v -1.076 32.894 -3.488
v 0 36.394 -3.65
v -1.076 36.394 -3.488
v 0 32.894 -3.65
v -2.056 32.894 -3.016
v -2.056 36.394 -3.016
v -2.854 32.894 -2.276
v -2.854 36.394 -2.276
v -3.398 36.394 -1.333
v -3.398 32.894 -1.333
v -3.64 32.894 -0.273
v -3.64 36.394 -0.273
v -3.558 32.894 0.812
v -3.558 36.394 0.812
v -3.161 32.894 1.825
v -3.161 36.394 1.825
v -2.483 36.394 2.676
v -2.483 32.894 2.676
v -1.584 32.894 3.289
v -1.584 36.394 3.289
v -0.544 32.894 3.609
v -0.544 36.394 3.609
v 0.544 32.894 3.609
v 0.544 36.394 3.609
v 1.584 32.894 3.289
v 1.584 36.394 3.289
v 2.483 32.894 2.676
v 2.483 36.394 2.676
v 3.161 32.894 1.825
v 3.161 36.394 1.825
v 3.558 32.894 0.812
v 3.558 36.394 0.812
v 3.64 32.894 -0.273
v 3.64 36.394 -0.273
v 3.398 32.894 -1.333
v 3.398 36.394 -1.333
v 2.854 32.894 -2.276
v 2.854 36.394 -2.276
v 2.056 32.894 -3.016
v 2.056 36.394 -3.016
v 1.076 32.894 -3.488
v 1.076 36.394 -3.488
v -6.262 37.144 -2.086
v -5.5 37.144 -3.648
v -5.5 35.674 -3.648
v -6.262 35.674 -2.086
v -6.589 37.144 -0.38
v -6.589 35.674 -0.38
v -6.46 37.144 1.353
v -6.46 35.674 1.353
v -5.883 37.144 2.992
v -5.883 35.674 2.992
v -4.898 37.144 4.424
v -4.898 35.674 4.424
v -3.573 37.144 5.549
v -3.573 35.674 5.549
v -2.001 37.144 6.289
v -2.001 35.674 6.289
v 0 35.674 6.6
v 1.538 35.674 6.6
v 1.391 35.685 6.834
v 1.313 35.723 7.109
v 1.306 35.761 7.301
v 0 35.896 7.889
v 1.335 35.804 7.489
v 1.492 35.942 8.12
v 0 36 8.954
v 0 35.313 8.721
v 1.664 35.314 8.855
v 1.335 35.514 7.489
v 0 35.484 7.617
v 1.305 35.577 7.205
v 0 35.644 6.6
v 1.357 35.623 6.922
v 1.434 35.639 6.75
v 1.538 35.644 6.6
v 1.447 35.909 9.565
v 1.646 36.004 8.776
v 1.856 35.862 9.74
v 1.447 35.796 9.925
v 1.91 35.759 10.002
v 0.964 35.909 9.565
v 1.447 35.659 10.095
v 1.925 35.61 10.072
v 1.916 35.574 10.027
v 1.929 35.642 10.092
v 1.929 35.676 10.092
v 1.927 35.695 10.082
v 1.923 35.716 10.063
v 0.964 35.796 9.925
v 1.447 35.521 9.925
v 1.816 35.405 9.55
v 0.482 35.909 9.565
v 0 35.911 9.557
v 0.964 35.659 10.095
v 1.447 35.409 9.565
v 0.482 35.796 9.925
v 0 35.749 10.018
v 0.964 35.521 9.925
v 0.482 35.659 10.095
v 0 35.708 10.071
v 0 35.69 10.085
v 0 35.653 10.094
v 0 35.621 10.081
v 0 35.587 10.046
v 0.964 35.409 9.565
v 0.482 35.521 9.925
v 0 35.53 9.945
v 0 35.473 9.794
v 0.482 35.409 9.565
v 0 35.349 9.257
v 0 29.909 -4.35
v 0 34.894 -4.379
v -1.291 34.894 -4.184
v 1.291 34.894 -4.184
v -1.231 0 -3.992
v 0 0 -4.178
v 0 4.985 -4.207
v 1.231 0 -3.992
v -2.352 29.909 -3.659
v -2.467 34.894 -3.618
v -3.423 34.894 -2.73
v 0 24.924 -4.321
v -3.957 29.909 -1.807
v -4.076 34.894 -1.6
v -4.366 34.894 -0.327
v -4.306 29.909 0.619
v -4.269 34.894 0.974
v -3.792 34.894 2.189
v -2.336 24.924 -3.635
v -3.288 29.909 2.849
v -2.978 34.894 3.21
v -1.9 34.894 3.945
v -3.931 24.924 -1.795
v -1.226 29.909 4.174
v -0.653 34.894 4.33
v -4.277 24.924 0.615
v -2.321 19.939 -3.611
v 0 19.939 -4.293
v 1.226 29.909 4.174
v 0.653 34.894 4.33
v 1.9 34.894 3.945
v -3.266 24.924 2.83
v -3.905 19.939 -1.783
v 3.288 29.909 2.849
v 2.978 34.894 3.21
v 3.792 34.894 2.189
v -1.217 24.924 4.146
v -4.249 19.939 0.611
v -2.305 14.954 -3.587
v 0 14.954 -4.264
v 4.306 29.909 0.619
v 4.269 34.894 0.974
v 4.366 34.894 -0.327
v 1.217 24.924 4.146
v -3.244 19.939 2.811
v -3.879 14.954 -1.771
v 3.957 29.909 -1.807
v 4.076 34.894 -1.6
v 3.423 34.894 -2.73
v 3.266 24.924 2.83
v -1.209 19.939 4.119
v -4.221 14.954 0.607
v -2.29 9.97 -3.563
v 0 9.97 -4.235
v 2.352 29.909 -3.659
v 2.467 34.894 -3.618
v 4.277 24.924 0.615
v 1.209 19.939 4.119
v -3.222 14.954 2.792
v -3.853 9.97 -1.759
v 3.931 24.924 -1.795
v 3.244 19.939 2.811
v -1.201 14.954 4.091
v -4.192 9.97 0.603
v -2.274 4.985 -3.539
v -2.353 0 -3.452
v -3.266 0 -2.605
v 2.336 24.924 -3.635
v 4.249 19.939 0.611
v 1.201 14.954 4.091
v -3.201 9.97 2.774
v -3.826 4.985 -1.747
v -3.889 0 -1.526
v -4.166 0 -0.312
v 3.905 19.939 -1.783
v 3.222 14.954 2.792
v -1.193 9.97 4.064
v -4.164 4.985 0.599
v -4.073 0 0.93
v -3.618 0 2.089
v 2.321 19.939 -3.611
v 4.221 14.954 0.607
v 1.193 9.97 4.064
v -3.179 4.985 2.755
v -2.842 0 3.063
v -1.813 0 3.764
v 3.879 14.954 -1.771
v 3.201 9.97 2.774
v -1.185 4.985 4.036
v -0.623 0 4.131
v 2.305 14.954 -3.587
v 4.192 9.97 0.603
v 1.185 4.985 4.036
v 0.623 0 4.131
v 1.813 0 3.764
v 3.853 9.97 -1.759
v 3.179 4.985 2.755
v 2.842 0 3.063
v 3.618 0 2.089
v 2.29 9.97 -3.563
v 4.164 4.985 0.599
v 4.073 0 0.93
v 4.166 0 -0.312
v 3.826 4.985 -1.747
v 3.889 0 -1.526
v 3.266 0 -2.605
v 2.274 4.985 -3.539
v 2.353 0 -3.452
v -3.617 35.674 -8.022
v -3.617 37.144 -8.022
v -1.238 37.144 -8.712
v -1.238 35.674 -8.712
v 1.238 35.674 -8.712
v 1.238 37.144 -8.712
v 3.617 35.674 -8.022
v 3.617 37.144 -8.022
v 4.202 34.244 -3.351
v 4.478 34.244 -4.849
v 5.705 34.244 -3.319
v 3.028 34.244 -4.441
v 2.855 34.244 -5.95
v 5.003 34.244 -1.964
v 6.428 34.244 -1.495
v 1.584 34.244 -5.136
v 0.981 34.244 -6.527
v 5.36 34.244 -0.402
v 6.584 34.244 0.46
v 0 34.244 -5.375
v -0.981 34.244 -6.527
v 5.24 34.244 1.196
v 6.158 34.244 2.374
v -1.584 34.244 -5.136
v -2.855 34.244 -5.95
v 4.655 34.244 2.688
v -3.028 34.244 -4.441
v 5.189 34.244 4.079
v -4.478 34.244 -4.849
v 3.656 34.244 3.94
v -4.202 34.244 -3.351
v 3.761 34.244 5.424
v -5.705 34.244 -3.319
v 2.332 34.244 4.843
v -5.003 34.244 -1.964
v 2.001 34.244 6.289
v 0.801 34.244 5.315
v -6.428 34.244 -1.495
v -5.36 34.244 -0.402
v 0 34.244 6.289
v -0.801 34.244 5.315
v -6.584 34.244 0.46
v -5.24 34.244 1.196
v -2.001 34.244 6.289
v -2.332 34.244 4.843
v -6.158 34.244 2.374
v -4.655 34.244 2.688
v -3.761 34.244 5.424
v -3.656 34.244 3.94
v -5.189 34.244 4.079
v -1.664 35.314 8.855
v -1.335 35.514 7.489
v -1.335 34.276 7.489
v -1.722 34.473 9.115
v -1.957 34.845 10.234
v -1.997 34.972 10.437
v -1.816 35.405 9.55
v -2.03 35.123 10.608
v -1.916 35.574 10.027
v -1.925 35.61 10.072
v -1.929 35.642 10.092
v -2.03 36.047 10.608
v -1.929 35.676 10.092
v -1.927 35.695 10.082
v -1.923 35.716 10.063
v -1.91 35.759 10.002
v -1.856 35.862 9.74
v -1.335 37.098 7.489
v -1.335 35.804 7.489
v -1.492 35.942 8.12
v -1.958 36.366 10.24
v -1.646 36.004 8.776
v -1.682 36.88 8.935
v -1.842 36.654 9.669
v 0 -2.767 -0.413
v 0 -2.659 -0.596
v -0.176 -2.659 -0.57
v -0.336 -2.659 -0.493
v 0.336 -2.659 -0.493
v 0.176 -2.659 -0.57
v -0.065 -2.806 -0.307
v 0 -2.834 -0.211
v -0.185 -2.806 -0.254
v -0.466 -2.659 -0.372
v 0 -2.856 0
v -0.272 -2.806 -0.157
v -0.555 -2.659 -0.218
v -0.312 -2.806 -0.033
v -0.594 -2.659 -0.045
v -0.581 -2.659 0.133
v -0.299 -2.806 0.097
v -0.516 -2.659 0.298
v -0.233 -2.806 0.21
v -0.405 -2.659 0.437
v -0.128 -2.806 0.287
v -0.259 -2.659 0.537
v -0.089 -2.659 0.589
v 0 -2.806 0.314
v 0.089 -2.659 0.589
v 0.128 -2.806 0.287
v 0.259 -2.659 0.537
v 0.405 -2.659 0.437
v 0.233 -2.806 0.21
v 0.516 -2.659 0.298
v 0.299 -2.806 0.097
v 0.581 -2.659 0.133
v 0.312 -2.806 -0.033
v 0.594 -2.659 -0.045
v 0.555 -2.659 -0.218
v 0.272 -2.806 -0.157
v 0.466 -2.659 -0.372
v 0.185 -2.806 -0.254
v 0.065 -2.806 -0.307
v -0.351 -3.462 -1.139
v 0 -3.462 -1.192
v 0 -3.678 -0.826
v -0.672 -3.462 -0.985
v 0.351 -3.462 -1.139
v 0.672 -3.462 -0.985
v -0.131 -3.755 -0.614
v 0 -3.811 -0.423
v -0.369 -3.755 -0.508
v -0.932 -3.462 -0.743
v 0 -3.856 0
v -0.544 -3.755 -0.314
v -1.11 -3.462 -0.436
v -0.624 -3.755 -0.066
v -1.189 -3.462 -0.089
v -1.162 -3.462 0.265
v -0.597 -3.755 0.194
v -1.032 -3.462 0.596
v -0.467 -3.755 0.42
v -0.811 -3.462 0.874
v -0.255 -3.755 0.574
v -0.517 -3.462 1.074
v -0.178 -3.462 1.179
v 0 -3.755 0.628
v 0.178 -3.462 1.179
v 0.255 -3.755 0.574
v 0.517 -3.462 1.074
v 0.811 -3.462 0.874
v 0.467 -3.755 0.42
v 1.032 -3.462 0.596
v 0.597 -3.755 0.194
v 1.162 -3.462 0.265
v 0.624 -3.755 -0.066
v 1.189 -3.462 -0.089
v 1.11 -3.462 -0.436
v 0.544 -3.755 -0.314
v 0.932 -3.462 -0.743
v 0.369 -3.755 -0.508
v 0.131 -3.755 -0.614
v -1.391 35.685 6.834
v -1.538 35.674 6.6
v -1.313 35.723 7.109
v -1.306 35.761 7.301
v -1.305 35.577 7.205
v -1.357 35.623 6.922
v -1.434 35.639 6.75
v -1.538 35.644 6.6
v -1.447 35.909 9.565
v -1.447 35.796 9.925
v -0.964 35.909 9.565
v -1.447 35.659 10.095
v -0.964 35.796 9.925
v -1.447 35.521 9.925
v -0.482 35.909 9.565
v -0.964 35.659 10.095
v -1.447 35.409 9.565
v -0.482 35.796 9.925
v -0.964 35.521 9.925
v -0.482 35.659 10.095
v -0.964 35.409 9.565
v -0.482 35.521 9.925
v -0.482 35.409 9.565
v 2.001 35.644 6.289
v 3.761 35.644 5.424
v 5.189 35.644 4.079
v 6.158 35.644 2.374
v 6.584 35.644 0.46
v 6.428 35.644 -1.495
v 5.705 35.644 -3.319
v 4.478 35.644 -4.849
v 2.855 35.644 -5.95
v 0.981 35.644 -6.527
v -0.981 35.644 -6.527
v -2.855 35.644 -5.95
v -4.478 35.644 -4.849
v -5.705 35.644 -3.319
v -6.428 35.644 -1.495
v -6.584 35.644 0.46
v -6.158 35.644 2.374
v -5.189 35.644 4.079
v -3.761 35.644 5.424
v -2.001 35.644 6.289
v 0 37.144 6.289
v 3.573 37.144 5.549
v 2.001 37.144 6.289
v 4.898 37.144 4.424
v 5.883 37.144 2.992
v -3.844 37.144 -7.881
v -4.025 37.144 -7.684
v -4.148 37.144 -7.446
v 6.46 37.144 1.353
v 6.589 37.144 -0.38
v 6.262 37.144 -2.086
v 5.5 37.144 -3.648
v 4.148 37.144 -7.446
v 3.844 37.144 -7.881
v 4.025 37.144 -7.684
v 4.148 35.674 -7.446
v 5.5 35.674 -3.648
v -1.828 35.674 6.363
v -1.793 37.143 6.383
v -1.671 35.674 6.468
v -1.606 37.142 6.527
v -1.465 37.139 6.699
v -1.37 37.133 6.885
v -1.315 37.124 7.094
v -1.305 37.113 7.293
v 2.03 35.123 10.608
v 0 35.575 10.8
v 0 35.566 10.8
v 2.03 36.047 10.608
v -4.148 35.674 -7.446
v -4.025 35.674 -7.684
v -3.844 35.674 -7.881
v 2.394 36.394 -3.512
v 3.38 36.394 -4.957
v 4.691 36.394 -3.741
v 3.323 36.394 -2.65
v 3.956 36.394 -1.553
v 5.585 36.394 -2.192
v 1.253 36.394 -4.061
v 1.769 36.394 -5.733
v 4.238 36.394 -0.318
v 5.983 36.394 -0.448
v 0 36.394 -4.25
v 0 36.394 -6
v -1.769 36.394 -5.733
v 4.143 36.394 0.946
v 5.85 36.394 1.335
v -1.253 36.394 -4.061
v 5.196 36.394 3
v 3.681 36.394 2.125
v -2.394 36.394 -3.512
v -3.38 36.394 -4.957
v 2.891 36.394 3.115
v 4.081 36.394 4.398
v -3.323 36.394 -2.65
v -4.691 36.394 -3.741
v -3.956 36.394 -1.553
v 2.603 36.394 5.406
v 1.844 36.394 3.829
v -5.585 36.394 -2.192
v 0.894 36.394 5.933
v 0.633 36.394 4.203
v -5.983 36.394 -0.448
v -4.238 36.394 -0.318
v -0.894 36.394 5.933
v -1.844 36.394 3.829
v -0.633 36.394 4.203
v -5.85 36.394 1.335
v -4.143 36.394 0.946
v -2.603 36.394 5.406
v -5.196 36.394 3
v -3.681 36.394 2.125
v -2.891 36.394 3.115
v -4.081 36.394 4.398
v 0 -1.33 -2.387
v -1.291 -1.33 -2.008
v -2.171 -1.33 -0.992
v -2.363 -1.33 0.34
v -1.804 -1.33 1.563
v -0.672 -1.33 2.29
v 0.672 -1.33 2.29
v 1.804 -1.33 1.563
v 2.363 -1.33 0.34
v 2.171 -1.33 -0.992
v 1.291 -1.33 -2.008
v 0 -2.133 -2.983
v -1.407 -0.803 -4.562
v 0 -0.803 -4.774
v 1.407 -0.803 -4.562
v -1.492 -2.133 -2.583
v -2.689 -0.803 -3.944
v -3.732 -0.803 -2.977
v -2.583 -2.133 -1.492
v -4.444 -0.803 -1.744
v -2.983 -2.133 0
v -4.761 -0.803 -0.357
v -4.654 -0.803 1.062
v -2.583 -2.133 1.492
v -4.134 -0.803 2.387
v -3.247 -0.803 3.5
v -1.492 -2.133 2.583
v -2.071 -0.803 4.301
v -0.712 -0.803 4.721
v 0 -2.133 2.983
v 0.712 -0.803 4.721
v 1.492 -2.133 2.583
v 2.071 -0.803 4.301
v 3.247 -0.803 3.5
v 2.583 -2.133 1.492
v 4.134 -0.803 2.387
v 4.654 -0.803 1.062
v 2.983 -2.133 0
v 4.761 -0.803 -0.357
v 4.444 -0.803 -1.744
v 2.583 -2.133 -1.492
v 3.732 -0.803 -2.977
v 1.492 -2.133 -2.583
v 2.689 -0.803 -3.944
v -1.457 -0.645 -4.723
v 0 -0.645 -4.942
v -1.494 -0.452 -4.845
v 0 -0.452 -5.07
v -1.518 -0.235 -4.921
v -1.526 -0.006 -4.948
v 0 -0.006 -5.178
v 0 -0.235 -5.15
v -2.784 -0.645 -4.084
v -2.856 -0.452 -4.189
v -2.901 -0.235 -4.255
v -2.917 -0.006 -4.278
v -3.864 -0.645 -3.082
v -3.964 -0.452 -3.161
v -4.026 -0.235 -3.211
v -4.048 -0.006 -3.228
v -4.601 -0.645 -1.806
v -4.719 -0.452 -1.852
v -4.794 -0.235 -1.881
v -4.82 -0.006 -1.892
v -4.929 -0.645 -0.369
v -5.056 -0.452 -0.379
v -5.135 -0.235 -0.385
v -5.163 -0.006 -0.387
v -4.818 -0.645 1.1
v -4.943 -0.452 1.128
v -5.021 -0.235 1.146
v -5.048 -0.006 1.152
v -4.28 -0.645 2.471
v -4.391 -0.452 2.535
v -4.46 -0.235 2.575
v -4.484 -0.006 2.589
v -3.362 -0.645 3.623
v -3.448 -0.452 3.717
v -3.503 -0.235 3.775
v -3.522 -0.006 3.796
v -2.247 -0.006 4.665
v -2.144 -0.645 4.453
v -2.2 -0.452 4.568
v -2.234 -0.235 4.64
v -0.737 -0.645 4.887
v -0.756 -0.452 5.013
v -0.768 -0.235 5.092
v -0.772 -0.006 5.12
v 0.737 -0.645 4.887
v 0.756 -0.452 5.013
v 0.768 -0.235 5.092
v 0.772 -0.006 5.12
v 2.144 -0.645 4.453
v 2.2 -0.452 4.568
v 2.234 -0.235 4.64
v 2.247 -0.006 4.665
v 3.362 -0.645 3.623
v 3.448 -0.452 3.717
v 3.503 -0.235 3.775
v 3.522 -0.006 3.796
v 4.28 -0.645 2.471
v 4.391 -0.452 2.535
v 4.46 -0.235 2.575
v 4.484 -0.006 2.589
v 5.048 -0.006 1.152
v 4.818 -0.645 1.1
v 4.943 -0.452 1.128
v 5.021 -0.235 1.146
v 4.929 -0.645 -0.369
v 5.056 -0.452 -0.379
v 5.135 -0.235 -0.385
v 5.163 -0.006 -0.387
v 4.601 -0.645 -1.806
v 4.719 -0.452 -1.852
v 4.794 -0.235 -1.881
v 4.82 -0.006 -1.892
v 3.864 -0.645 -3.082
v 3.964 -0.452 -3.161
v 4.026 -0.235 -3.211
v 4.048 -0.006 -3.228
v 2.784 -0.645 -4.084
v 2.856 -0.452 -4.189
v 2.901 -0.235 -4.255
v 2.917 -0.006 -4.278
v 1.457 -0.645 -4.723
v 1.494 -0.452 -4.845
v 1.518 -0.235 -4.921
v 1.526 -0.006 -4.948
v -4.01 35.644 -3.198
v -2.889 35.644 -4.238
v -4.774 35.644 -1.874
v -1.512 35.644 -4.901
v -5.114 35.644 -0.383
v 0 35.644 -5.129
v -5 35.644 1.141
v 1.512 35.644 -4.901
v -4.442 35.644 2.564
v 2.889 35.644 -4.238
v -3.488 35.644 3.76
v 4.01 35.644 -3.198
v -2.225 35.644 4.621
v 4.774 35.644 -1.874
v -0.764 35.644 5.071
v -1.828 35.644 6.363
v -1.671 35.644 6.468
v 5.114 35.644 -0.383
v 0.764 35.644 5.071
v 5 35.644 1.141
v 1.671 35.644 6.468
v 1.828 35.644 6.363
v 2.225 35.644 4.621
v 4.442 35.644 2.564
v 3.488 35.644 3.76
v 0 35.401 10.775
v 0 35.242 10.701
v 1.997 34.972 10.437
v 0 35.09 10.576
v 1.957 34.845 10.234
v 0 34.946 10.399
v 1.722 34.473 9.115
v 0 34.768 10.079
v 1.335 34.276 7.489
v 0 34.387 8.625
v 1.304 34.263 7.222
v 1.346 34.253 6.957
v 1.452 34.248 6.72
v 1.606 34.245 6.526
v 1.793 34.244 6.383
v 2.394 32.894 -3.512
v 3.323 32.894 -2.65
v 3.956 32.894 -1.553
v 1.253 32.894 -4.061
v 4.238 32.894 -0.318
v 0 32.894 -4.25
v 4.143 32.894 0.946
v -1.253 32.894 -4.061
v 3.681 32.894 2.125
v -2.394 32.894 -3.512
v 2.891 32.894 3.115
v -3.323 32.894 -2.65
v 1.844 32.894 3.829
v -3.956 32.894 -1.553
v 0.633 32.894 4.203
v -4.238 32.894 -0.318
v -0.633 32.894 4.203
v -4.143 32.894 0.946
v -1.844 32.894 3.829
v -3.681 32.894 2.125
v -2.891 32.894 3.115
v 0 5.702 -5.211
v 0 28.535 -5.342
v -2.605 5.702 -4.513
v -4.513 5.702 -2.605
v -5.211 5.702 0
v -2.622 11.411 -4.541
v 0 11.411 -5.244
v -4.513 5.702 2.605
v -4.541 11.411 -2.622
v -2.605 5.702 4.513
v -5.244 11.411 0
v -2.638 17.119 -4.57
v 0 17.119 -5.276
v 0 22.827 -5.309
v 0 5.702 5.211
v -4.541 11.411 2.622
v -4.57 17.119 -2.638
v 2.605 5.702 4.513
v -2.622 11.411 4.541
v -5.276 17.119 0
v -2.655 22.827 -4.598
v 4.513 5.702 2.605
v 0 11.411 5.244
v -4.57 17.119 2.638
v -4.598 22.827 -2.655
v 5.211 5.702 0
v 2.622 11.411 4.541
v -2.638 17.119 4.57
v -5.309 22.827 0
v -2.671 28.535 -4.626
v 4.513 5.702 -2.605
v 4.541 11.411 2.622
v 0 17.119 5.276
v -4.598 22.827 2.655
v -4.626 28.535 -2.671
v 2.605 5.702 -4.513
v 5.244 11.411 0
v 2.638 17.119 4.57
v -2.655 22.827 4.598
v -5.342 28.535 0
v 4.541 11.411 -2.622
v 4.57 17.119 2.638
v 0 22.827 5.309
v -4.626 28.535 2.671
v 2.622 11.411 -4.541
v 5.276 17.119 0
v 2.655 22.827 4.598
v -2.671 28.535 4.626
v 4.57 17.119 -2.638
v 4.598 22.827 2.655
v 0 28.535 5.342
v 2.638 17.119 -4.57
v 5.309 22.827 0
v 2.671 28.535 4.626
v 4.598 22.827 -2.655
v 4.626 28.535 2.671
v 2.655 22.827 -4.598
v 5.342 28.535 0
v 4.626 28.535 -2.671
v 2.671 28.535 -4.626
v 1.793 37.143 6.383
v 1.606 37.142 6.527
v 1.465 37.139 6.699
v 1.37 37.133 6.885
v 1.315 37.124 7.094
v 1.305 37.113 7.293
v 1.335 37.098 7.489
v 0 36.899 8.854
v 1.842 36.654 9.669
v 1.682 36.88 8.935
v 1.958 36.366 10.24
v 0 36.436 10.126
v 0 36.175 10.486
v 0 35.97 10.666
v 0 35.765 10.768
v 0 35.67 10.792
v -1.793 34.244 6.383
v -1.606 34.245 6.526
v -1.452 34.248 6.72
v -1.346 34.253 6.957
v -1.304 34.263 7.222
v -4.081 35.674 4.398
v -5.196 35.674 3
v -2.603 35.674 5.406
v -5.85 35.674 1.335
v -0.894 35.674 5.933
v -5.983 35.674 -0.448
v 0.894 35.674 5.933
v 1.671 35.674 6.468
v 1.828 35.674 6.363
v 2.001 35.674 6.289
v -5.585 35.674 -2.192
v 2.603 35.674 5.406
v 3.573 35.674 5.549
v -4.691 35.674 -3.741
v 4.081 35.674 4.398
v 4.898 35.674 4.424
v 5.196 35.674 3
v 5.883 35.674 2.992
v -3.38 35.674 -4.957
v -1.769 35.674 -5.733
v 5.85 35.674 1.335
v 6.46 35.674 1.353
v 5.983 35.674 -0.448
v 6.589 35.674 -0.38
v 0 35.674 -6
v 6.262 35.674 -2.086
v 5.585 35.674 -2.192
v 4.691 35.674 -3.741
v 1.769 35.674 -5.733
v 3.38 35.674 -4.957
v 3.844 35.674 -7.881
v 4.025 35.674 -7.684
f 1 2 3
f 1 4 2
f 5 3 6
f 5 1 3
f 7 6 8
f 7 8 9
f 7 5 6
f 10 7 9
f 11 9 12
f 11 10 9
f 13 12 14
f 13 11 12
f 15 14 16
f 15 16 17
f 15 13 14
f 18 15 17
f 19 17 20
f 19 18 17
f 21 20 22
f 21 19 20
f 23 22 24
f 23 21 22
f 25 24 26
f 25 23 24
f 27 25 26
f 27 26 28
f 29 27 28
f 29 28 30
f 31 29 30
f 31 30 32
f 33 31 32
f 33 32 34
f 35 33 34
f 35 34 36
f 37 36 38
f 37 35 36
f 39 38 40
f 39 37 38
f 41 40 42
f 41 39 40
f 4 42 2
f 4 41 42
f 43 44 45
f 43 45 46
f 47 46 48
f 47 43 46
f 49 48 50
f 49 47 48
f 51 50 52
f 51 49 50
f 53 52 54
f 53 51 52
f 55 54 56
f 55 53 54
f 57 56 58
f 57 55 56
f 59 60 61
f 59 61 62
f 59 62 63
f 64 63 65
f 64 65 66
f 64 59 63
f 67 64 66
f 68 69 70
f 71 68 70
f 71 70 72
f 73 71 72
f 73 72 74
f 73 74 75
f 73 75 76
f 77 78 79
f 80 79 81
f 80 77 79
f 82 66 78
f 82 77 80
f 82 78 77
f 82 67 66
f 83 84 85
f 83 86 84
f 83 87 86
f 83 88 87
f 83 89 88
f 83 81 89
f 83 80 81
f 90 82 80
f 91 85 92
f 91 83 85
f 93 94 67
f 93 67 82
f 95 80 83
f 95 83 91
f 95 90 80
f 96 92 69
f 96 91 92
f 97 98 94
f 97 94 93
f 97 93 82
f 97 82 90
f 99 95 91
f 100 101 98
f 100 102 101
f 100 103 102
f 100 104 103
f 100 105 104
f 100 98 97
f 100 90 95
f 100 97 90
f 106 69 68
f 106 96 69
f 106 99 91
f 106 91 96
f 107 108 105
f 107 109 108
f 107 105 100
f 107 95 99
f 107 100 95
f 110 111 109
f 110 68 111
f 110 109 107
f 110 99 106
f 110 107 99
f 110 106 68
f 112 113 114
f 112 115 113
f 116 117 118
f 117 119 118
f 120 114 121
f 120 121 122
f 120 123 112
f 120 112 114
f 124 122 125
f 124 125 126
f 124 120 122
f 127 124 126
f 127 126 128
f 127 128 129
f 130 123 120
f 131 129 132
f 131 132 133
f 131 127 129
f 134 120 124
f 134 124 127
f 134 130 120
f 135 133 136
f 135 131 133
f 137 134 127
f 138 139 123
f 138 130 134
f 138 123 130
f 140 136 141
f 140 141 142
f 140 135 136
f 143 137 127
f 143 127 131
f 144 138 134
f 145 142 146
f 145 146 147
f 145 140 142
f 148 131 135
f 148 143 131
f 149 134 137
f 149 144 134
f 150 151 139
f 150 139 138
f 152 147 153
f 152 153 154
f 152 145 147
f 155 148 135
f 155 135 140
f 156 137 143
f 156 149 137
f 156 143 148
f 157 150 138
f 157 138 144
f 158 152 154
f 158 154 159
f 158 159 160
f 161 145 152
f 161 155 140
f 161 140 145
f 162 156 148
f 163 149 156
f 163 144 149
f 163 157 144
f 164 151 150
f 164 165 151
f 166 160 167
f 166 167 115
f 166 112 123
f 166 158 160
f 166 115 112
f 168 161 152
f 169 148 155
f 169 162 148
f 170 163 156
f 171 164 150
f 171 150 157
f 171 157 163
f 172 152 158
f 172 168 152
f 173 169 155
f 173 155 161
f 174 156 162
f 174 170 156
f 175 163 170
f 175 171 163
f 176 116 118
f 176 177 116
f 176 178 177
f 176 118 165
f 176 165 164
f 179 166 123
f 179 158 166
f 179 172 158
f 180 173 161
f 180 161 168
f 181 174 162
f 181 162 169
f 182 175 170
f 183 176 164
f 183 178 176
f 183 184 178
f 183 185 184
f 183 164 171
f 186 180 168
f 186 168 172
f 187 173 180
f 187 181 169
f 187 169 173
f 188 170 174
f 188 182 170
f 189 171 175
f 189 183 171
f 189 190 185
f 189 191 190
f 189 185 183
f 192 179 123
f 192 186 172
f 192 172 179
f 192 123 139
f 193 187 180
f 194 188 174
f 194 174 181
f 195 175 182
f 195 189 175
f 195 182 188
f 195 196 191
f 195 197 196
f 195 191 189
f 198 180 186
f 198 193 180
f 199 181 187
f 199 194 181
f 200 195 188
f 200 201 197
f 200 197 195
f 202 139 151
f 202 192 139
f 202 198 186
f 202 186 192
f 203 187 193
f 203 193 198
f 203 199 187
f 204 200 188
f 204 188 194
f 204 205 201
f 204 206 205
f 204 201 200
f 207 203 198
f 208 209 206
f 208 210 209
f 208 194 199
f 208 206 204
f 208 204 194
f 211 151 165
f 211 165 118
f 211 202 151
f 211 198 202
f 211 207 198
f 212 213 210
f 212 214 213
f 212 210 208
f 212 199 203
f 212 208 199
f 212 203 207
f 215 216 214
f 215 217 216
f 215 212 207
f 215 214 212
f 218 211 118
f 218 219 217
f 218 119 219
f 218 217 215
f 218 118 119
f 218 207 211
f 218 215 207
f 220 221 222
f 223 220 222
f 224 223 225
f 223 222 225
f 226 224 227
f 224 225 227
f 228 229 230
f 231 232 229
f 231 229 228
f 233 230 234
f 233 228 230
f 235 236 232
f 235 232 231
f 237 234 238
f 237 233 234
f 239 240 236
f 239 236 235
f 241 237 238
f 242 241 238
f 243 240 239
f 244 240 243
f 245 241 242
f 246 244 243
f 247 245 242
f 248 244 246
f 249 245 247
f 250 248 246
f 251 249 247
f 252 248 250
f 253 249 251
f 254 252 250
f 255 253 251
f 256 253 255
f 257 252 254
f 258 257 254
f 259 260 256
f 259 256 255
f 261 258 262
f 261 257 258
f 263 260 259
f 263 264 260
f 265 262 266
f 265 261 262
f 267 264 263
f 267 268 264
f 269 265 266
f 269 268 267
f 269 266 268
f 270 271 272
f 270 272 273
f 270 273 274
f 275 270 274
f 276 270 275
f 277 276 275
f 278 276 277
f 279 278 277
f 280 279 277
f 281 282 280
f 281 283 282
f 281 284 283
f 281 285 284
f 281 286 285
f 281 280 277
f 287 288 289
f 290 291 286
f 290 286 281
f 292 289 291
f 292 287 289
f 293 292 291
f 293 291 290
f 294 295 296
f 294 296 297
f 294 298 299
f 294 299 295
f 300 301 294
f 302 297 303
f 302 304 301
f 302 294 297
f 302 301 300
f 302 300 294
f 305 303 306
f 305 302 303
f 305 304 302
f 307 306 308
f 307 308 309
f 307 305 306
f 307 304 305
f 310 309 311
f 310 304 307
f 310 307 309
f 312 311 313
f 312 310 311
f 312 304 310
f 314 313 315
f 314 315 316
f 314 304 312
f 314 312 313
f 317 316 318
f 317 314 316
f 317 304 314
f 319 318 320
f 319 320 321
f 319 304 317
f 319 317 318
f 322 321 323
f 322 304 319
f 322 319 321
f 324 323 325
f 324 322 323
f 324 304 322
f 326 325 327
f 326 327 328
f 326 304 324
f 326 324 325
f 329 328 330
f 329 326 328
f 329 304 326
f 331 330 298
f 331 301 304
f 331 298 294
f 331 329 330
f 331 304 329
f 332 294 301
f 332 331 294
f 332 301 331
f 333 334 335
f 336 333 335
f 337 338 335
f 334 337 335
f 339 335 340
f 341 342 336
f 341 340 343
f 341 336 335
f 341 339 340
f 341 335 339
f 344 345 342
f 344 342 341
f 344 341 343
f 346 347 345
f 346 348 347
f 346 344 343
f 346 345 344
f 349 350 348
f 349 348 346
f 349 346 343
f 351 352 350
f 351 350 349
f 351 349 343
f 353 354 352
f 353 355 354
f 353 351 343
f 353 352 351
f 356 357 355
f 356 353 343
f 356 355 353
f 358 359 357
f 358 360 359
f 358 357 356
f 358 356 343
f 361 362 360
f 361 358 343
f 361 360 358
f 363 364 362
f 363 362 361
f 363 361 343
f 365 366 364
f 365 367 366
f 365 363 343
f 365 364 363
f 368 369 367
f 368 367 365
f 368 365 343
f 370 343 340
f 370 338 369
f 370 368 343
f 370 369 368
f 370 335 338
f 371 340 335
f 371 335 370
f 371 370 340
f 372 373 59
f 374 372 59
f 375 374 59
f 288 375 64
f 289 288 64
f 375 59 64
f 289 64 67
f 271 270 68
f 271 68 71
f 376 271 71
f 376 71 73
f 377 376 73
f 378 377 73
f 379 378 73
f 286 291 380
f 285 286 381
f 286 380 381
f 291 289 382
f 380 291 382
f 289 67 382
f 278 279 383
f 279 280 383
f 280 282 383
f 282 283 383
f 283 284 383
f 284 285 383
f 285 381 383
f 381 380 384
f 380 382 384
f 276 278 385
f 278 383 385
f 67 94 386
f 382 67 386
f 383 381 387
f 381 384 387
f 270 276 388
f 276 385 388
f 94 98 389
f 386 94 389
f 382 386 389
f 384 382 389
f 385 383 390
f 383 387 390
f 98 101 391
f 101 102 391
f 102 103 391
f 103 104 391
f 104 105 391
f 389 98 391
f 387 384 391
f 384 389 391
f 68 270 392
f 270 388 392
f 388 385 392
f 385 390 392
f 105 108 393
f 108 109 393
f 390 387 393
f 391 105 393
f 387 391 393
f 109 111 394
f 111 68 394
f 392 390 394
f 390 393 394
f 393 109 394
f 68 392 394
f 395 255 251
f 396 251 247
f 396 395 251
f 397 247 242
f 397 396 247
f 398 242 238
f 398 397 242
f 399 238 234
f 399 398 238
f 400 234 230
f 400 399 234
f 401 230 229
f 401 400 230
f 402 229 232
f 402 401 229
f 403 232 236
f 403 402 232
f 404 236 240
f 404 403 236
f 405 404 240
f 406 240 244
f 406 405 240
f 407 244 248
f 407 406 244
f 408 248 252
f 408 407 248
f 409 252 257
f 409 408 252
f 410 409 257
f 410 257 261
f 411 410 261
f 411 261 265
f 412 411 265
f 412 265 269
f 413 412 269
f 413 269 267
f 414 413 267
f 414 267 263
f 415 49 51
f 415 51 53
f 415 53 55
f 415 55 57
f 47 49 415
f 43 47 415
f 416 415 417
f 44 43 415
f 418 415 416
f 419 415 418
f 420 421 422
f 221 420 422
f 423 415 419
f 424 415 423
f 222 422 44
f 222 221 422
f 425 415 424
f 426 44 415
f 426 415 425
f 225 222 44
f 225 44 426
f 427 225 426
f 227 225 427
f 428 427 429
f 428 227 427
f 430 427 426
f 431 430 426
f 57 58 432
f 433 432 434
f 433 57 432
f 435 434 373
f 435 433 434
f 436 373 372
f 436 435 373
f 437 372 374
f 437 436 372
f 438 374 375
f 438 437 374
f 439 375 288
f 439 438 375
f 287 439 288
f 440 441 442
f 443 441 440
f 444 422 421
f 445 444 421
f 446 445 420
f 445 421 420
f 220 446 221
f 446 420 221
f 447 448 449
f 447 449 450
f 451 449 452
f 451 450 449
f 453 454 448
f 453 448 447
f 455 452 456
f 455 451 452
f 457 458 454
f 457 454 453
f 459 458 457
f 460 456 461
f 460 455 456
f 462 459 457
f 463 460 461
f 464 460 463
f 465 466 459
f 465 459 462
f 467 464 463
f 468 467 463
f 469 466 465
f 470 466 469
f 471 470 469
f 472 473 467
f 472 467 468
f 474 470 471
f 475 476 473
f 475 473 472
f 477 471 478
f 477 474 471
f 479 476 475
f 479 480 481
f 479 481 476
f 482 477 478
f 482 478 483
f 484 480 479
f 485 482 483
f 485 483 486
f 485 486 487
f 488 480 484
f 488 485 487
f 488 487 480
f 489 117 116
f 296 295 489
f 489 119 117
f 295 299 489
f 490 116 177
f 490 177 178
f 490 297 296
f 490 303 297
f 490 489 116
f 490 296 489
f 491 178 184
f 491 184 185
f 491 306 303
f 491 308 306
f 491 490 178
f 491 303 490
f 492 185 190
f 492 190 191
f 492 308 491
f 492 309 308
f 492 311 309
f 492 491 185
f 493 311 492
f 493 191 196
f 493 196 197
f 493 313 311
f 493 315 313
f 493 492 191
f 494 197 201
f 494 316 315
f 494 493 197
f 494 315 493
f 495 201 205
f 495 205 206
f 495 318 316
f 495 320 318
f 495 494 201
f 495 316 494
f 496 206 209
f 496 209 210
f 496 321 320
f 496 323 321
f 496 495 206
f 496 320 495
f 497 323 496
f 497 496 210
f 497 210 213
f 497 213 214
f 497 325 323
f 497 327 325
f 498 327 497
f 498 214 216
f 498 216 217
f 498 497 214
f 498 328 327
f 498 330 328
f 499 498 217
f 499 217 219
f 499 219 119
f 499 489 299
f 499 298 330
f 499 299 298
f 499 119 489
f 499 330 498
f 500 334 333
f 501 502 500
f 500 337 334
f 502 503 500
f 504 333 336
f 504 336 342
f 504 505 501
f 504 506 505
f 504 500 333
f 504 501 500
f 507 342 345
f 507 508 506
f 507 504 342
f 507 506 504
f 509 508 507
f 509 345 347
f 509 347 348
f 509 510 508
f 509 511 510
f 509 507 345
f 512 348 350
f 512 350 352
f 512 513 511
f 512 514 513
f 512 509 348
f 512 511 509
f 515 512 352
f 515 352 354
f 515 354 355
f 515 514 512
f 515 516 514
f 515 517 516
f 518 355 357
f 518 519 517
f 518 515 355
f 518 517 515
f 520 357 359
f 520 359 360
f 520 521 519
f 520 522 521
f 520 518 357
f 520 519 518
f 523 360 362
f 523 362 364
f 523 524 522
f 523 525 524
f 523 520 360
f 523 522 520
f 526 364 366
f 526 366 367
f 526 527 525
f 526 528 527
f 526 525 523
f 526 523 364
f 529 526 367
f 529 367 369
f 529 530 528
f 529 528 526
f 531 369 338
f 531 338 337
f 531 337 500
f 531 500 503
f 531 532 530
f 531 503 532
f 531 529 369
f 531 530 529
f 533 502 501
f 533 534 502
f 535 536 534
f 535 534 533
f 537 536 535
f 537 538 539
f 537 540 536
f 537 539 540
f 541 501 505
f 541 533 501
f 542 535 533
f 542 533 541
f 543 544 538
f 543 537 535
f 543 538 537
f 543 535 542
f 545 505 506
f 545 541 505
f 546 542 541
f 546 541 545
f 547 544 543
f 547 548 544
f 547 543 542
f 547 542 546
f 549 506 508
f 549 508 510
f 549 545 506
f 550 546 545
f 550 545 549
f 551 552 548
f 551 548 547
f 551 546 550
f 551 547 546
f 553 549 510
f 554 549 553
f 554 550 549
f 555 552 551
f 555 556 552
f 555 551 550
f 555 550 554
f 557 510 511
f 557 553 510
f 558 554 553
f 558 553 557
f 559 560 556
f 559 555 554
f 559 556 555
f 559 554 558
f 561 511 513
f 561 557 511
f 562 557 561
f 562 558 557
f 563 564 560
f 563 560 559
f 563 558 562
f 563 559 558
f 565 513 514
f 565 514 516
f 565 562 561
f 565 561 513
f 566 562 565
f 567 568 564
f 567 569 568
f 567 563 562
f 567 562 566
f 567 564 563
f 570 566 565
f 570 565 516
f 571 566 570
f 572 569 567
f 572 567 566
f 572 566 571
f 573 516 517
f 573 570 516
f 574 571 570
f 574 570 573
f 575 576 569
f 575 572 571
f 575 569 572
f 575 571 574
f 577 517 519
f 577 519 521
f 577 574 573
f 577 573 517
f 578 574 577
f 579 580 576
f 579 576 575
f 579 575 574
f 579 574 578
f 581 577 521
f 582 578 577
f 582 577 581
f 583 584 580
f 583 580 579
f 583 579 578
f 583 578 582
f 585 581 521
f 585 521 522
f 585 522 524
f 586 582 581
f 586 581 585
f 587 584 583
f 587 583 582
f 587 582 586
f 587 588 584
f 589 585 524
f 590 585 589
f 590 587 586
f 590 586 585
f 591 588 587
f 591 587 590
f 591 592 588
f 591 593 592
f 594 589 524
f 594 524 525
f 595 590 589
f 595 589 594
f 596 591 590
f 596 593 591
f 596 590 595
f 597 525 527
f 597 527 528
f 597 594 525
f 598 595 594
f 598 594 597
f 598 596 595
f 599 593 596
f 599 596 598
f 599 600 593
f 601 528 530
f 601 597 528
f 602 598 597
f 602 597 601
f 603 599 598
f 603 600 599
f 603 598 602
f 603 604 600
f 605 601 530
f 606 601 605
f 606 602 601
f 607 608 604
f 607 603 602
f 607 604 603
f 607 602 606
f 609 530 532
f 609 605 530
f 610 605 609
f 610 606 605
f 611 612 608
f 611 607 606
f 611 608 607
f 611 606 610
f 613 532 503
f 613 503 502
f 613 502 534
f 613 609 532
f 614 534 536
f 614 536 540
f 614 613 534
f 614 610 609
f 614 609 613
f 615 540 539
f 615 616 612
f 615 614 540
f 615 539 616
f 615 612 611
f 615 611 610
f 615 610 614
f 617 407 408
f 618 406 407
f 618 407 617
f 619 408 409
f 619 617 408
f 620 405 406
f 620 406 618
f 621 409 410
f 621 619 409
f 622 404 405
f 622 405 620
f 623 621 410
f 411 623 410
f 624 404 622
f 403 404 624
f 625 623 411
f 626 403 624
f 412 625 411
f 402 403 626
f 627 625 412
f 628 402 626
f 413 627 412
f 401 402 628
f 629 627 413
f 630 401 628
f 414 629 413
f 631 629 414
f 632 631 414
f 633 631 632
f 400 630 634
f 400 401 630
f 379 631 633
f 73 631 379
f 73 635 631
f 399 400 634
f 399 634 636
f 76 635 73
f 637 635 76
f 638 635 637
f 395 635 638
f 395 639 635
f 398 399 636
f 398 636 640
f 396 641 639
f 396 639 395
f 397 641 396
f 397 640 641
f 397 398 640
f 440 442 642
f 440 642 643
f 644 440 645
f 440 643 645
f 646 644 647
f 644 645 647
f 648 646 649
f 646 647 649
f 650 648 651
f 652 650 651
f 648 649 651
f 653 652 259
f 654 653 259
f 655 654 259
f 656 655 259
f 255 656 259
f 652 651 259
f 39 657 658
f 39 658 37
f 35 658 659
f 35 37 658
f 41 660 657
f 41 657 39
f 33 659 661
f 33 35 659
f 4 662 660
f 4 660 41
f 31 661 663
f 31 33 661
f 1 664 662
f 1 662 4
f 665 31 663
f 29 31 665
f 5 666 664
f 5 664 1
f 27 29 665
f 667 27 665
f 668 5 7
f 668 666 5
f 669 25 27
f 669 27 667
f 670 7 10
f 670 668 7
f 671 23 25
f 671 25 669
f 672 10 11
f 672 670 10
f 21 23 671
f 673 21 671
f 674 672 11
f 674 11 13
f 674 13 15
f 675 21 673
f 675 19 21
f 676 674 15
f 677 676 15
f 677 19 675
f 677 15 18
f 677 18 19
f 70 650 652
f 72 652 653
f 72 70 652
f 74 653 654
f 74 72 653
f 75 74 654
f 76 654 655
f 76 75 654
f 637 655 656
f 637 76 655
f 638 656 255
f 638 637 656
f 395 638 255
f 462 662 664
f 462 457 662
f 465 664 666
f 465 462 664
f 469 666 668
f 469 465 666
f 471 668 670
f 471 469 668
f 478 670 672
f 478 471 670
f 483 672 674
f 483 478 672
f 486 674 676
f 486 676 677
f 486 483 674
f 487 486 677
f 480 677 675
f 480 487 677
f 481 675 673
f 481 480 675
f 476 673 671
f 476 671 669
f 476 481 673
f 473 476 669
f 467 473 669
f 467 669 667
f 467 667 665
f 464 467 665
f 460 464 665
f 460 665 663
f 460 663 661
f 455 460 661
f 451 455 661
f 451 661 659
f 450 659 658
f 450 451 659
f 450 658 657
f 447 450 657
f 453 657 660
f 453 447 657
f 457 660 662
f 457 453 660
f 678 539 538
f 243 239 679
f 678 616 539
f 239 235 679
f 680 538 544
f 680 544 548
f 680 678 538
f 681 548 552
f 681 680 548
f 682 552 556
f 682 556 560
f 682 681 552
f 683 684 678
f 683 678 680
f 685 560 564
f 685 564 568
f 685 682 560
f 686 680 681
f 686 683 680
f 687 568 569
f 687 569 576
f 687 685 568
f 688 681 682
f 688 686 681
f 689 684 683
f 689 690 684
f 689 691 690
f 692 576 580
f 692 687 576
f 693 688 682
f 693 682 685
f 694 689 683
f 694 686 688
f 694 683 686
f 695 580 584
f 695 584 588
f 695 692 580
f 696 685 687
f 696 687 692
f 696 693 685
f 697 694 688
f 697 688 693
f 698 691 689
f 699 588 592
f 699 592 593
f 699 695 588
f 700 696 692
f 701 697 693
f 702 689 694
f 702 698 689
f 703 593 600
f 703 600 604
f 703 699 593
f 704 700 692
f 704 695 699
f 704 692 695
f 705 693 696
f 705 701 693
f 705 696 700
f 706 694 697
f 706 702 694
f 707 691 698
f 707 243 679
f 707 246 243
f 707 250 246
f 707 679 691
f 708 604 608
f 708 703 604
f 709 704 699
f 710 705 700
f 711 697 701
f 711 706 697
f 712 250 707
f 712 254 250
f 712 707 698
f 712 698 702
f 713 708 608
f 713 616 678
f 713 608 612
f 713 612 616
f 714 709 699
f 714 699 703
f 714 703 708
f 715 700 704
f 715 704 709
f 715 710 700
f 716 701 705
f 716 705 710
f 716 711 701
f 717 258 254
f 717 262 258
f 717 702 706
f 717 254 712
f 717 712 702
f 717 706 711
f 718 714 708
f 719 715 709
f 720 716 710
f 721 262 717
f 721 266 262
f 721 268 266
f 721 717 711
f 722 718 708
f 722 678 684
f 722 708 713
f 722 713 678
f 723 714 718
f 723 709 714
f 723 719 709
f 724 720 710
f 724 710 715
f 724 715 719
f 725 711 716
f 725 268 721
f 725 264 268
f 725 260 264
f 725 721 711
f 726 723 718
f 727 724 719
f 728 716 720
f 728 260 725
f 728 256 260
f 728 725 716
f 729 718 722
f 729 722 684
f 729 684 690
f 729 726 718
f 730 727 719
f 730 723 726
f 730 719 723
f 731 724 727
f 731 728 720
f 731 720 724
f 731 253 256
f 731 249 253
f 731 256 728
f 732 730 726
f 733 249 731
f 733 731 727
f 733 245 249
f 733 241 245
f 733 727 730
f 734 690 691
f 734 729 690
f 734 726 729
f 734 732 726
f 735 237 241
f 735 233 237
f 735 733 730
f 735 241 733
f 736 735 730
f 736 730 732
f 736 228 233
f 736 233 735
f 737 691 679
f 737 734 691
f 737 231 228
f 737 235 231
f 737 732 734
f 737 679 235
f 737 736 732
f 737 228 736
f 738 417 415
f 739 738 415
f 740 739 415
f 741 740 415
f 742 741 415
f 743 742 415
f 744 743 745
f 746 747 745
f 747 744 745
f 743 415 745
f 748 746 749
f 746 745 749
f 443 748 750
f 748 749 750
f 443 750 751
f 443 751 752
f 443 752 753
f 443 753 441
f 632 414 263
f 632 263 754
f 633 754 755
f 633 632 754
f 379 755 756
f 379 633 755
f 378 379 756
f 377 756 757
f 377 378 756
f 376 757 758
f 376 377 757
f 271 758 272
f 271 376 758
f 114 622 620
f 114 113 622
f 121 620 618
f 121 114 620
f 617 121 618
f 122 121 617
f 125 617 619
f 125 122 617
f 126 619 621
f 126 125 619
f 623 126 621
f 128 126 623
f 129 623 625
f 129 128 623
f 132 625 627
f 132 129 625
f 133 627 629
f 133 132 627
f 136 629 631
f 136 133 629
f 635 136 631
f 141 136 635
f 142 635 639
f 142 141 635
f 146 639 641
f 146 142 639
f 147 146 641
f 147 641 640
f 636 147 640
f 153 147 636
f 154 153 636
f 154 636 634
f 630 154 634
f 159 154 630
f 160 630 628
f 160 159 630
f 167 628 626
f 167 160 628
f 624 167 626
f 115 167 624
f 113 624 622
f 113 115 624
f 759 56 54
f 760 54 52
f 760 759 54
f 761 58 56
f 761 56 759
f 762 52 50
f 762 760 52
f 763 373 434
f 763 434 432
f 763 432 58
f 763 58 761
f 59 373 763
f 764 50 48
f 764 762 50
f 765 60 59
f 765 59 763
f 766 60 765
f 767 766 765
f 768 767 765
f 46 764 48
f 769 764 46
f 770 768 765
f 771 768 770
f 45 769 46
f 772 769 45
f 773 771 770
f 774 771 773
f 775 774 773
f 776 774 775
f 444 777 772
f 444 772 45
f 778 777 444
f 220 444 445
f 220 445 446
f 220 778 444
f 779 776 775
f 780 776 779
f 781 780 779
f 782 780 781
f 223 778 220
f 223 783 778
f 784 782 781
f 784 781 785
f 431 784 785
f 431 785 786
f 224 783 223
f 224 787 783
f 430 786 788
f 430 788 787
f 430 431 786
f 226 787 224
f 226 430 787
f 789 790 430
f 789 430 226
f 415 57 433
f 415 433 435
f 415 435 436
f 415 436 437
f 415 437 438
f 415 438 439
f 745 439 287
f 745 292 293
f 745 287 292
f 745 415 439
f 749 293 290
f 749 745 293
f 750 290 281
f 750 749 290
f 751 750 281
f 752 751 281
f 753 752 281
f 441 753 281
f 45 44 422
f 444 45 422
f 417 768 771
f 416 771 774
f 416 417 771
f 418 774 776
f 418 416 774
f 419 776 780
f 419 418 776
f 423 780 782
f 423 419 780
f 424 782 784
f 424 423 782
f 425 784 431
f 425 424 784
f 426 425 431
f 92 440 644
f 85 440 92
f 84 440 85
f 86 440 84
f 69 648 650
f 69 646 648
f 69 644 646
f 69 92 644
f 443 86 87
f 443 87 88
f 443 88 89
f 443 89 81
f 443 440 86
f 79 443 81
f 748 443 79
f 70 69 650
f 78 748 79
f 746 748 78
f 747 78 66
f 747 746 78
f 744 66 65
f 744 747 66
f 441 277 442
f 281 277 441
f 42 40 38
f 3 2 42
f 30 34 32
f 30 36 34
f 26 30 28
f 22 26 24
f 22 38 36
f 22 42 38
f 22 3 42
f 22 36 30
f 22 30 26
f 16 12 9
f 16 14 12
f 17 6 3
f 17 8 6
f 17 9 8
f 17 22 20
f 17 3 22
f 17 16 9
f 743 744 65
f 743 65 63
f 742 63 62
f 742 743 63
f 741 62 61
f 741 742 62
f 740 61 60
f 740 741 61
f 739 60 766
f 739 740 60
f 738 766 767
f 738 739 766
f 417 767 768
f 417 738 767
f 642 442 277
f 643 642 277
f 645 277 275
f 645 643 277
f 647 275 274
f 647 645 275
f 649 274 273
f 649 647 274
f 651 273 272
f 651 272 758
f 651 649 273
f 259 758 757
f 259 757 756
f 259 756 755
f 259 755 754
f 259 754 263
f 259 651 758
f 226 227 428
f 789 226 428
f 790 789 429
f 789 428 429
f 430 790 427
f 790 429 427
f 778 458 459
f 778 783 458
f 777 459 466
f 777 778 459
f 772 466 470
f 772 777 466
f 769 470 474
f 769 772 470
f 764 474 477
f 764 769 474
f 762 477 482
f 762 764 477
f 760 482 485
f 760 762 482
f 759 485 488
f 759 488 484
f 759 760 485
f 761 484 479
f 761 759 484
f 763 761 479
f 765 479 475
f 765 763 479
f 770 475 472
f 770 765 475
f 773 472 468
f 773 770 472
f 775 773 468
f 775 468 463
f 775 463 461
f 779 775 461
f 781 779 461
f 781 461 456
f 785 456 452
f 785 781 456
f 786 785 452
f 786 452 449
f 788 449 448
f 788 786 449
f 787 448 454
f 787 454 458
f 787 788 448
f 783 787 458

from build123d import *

# Parameters (mm, degrees)
BOSS_EXTRUDE1_DEPTH     = 1.47
BOSS_EXTRUDE2_REACH     = 44.45
CUT_EXTRUDE1_DEPTH      = 40.240986748
CUT_EXTRUDE1_DEPTH_BACK = 40.240986748


with BuildPart() as part:
    # Sketch1 → Revolve1 (revolve)
    with BuildSketch(Plane.XY, mode=Mode.PRIVATE) as revolve1_sk:
        with BuildLine():
            Line((1.192198173, -3.462113799), (4.773990196, -0.802910879))
            ThreePointArc((4.773990196, -0.802910879), (5.069930367, -0.451957922), (5.177874547, -0.005755483))
            Line((5.177874547, -0.005755483), (5.375, 34.243707959))
            Line((5.375, 34.243707959), (6.6, 34.243707959))
            Line((6.6, 34.243707959), (6.6, 35.643707959))
            Line((6.6, 35.643707959), (5.128724562, 35.643707959))
            Line((5.128724562, 35.643707959), (4.378724562, 34.893707959))
            Line((4.378724562, 34.893707959), (4.17789111, 0))
            Line((4.17789111, 0), (0.596099086, -2.65920292))
            ThreePointArc((0.596099086, -2.65920292), (0.31391808, -2.805742113), (0, -2.856292041))
            Line((0, -2.856292041), (0, -3.856292041))
            ThreePointArc((0, -3.856292041), (0.627836159, -3.755192185), (1.192198173, -3.462113799))
        make_face()
        Polygon((4.25, 32.893707959), (4.25, 36.393707959), (6, 36.393707959), (6, 35.673707959), (6.6, 35.673707959), (6.6, 36.140431751), (6.6, 37.143707959), (0, 37.143707959), (0, 36.393707959), (3.65, 36.393707959), (3.65, 32.893707959), align=None)
    revolve(revolve1_sk.sketch.rotate(Axis((0, 0, 0), (0, 1, 0)), 90), axis=Axis((0, 0, 0), (0, 1, 0)))

    # Sketch2 → Boss-Extrude1 (add)
    with BuildSketch(Plane(origin=(0, 37.143707959, 0), x_dir=(1, 0, 0), z_dir=(0, 1, 0))):
        with BuildLine():
            Line((-5.5, 3.648287269), (-4.147964107, 7.446102732))
            ThreePointArc((-4.147964107, 7.446102732), (-3.941225776, 7.788413444), (-3.616893324, 8.02234895))
            ThreePointArc((-3.616893324, 8.02234895), (0, 8.8), (3.616893324, 8.02234895))
            ThreePointArc((3.616893324, 8.02234895), (3.941225776, 7.788413444), (4.147964107, 7.446102732))
            Line((4.147964107, 7.446102732), (5.5, 3.648287269))
            ThreePointArc((5.5, 3.648287269), (0, 6.6), (-5.5, 3.648287269))
        make_face()
    extrude(amount=-BOSS_EXTRUDE1_DEPTH)

    # Boss-Extrude2: up to this face of the body (flat: up to its plane)
    boss_extrude2_end = Plane(part.part.faces().sort_by_distance((0, 34.243707959, 5.56167619))[0])
    # Sketch3 → Boss-Extrude2 (add, up to the picked face)
    with BuildSketch(Plane(origin=(0, 37.143707959, 0), x_dir=(1, 0, 0), z_dir=(0, 1, 0)), mode=Mode.PRIVATE) as boss_extrude2_sk1:
        with BuildLine():
            Line((0, -6.6), (0, -10.8))
            ThreePointArc((0, -10.8), (1.019553267, -10.751767814), (2.03, -10.607502062))
            ThreePointArc((2.03, -10.607502062), (1.706052324, -9.043133027), (1.335, -7.489262778))
            ThreePointArc((1.335, -7.489262778), (1.429653992, -6.757094078), (2.000871697, -6.289396828))
            ThreePointArc((2.000871697, -6.289396828), (1.01241813, -6.521886961), (0, -6.6))
        make_face()
    boss_extrude2_tool1 = split(extrude(boss_extrude2_sk1.sketch, amount=-BOSS_EXTRUDE2_REACH, mode=Mode.PRIVATE), bisect_by=boss_extrude2_end, keep=Keep.BOTH, mode=Mode.PRIVATE)
    # Sketch3 → Boss-Extrude2 (add, up to the picked face)
    with BuildSketch(Plane(origin=(0, 37.143707959, 0), x_dir=(1, 0, 0), z_dir=(0, 1, 0)), mode=Mode.PRIVATE) as boss_extrude2_sk2:
        with BuildLine():
            ThreePointArc((-2.03, -10.607502062), (-1.019553267, -10.751767814), (0, -10.8))
            Line((0, -10.8), (0, -6.6))
            ThreePointArc((0, -6.6), (-1.01241813, -6.521886961), (-2.000871697, -6.289396828))
            ThreePointArc((-2.000871697, -6.289396828), (-1.429653992, -6.757094078), (-1.335, -7.489262778))
            ThreePointArc((-1.335, -7.489262778), (-1.706052324, -9.043133027), (-2.03, -10.607502062))
        make_face()
    boss_extrude2_tool2 = split(extrude(boss_extrude2_sk2.sketch, amount=-BOSS_EXTRUDE2_REACH, mode=Mode.PRIVATE), bisect_by=boss_extrude2_end, keep=Keep.BOTH, mode=Mode.PRIVATE)
    add(boss_extrude2_tool1.solids().sort_by(Axis((0.832919, 37.143708, 8.79495), (0, -1, 0)))[0])
    add(boss_extrude2_tool2.solids().sort_by(Axis((-0.832919, 37.143708, 8.79495), (0, -1, 0)))[0])

    # Sketch5 → Cut-Extrude1 (cut, two sides)
    with BuildSketch(Plane(origin=(0, 0, 0), x_dir=(0, 0, -1), z_dir=(1, 0, 0))) as cut_extrude1_sk:
        with BuildLine():
            Line((-6.289396828, 35.643707959), (-6.6, 35.643707959))
            add(Edge.make_bspline(
                [(-6.6, 35.673707959), (-7.519037203, 35.673707959), (-8.421750075, 36.327077496), (-10.369945566, 35.658707959), (-8.421586809, 34.990338421), (-7.521291173, 35.643707959), (-6.6, 35.643707959)],
                knots=[0, 0, 0, 0, 0.417765924, 0.5, 0.582234076, 1, 1, 1, 1], degree=3))
            Line((-6.6, 35.673707959), (-6.289396828, 35.673707959))
            Line((-6.289396828, 35.673707959), (-6.289396828, 35.643707959))
        make_face()
        with BuildLine():
            Line((-6.289396828, 34.243707959), (-6.289396828, 33.533396672))
            Line((-6.289396828, 33.533396672), (-11.467394827, 33.825492735))
            Line((-11.467394827, 33.825492735), (-11.357937817, 38.544473635))
            Line((-11.357937817, 38.544473635), (-6.289396828, 38.035452095))
            Line((-6.289396828, 38.035452095), (-6.289396828, 37.143707959))
            add(Edge.make_bspline(
                [(-6.289396828, 37.143707959), (-9.431918588, 37.143707959), (-12.135369897, 35.479054802), (-9.496663947, 34.243707959), (-6.289396828, 34.243707959)],
                knots=[0, 0, 0, 0, 0.503821902, 1, 1, 1, 1], degree=3))
        make_face()
    extrude(amount=CUT_EXTRUDE1_DEPTH, mode=Mode.SUBTRACT)
    extrude(cut_extrude1_sk.sketch, amount=-CUT_EXTRUDE1_DEPTH_BACK, mode=Mode.SUBTRACT)


solid = part.part
